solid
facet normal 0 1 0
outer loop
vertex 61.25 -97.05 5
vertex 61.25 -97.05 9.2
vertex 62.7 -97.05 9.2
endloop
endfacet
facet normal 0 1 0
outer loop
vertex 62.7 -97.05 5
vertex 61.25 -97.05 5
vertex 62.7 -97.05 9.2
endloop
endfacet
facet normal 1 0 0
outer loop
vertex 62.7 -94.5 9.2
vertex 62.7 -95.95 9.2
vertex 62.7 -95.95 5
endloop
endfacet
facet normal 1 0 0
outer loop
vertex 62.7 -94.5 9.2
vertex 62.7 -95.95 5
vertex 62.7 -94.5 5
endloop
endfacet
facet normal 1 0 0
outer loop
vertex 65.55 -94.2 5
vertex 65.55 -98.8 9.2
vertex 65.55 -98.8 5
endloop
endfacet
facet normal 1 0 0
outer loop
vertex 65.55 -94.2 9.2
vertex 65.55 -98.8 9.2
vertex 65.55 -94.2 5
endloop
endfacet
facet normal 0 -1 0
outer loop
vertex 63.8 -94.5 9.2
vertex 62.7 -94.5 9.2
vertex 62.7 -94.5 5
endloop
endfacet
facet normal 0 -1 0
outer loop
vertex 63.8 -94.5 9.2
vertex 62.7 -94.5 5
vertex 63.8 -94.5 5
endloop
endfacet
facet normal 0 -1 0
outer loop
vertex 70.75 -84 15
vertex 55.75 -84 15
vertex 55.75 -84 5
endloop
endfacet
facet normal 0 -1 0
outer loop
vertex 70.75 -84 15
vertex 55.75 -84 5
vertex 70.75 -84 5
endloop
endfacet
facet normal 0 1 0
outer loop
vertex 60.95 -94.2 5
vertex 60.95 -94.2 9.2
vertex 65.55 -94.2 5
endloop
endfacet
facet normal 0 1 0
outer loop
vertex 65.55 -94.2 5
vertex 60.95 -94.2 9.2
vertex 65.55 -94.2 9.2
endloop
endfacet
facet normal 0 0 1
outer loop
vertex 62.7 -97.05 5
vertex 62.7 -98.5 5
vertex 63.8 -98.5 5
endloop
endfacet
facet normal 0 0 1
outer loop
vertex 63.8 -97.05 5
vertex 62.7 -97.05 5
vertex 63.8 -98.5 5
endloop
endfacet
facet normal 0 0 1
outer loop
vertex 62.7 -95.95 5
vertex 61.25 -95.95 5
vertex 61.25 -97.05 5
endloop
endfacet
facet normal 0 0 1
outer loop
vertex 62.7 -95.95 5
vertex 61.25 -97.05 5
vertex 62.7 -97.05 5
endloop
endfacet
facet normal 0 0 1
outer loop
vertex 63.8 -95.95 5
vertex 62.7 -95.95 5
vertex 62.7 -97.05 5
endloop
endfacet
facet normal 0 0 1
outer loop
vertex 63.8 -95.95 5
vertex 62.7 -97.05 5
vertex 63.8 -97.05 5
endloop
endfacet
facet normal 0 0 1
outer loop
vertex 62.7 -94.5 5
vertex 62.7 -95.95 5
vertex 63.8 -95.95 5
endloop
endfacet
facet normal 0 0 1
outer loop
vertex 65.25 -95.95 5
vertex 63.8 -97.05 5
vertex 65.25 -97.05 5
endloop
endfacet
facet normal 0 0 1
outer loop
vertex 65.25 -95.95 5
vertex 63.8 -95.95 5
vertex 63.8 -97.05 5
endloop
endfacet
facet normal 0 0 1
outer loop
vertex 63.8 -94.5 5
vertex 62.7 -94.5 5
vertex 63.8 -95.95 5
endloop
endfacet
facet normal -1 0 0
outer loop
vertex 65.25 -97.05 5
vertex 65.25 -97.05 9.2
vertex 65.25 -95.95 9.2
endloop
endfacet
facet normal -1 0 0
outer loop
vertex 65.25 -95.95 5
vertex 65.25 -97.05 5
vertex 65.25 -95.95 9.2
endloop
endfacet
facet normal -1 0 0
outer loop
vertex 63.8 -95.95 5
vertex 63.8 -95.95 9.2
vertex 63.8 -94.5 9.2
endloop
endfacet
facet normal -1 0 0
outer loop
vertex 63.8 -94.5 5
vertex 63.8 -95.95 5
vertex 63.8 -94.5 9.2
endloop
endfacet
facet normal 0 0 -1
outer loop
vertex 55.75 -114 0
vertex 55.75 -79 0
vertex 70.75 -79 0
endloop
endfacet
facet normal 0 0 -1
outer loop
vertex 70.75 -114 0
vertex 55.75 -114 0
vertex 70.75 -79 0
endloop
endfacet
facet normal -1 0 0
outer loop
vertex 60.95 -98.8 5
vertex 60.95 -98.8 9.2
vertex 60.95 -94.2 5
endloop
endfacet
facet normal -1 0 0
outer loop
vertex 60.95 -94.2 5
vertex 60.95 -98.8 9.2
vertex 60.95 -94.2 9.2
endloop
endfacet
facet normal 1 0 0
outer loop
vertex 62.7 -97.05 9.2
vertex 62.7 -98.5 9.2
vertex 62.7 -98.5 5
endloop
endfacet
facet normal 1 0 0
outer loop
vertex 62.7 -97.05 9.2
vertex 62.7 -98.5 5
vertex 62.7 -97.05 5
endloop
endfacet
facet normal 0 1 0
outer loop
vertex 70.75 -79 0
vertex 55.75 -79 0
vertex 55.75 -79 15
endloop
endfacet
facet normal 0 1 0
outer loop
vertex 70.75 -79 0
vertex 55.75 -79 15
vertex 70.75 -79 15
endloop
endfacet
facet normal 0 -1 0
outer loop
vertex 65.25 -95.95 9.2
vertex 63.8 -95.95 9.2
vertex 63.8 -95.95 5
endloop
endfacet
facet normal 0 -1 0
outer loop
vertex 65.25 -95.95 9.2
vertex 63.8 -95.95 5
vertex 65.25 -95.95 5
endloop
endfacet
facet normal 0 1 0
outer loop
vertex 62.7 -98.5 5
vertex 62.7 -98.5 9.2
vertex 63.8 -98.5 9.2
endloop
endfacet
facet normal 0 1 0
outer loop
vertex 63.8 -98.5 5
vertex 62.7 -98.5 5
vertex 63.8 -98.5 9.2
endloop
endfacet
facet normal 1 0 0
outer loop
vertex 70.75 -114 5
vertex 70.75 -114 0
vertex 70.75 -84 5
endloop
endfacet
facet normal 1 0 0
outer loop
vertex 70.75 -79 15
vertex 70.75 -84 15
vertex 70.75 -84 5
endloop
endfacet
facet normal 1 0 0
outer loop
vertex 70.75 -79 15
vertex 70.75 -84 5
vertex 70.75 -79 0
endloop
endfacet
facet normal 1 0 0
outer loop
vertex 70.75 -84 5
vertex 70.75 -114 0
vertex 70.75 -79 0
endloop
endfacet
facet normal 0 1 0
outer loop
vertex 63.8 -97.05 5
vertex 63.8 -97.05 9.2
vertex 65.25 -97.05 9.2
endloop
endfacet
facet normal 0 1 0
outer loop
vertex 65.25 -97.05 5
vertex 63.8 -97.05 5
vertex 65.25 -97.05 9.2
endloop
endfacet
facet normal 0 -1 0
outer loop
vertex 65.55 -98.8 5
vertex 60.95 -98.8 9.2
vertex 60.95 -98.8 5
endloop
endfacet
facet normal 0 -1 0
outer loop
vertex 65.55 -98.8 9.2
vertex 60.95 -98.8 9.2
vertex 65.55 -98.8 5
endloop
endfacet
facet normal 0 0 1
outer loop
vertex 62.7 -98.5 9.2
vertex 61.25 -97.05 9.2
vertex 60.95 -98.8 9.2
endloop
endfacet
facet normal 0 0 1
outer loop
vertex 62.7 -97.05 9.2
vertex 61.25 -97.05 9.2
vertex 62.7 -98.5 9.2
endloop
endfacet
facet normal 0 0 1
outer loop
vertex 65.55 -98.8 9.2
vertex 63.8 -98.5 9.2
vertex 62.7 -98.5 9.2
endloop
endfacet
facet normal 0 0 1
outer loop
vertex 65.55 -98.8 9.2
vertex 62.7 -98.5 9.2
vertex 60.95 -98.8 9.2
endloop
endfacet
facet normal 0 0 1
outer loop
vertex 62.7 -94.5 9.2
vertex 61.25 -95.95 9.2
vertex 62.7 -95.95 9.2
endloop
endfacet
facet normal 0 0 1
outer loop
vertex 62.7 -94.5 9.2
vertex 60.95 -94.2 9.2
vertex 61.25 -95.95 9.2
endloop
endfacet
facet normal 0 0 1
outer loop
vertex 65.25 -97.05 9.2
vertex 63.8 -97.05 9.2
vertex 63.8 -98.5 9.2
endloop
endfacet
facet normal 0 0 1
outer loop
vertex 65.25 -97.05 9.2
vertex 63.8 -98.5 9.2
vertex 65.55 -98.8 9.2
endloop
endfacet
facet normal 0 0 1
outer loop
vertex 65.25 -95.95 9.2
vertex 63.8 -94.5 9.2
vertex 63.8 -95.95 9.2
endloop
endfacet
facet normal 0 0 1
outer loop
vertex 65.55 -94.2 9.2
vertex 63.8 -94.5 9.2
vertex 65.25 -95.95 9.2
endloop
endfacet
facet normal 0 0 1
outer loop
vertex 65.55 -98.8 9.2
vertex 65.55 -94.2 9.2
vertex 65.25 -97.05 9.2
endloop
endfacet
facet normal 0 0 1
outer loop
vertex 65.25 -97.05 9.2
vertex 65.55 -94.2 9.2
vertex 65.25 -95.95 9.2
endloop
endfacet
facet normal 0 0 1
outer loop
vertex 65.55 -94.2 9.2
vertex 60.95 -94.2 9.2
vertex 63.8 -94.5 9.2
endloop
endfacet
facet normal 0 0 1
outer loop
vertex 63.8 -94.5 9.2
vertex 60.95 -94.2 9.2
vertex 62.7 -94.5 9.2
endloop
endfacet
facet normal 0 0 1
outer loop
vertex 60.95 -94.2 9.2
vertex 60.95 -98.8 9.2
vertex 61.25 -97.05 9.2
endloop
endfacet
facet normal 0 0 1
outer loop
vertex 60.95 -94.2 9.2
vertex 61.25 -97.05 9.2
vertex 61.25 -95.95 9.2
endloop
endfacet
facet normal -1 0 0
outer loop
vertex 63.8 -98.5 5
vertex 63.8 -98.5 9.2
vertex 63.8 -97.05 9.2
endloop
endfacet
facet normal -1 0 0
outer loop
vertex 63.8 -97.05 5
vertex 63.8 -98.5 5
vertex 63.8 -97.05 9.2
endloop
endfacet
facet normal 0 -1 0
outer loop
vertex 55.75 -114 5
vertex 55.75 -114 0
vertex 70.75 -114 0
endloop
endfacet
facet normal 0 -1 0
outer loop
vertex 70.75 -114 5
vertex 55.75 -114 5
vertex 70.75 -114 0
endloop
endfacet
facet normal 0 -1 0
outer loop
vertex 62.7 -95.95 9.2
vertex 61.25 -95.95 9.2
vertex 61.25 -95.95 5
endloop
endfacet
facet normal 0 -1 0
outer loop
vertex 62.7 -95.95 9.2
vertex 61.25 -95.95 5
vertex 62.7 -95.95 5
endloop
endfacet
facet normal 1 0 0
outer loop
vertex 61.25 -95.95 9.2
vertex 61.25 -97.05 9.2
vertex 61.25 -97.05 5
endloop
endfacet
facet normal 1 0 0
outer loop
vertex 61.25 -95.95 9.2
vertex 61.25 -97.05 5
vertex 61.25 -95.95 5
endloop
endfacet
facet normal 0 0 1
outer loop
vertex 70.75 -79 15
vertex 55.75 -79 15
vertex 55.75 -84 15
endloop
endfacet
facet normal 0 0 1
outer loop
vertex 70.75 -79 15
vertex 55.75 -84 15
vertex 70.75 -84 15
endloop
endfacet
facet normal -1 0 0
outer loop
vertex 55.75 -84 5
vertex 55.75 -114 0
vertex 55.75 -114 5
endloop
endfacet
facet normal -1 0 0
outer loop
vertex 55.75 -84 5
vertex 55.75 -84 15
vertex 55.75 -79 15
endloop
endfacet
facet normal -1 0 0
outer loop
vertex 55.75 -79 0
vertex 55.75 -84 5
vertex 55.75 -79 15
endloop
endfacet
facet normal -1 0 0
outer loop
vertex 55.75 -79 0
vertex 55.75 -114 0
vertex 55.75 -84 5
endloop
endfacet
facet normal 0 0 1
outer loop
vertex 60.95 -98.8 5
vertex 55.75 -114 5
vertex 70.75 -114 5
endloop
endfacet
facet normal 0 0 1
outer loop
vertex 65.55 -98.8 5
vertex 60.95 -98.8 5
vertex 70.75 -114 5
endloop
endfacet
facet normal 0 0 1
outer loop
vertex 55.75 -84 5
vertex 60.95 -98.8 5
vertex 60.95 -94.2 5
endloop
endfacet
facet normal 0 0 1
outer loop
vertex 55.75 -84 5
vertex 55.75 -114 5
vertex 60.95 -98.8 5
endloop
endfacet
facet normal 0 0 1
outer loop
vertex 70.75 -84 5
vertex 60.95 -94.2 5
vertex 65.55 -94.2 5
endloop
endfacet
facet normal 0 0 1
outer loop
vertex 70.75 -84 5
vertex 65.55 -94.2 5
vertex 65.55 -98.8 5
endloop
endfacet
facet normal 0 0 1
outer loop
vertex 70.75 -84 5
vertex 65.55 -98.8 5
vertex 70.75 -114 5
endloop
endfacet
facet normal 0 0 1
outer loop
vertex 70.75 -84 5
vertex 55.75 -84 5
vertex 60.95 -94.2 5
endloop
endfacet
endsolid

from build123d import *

# Parameters (mm, degrees)
SKETCH_W        = 15
SKETCH_H        = 35
PAD_DEPTH       = 15
SKETCH001_W     = 25
SKETCH001_H     = 36
SKETCH001_W_2   = 4.6
SKETCH001_H_2   = 4.6
SKETCH001_W_3   = 1.1
SKETCH001_H_3   = 4
POCKET_DEPTH    = 10
SKETCH002_W     = 4
SKETCH002_H     = 1.1
POCKET001_DEPTH = 10
SKETCH003_W     = 6
SKETCH003_H     = 6
POCKET002_DEPTH = 5.8


with BuildPart() as part:
    # Sketch → Pad (new body)
    with BuildSketch(Plane.XY):
        with Locations((63.25, -96.5)):
            Rectangle(SKETCH_W, SKETCH_H)
    extrude(amount=PAD_DEPTH)

    # Sketch001 (on DatumPlane) → Pocket (cut)
    with BuildSketch(Plane.XY.offset(15)):
        with Locations((62.5, -102)):
            Rectangle(SKETCH001_W, SKETCH001_H)
        with Locations((63.25, -96.5)):
            Rectangle(SKETCH001_W_2, SKETCH001_H_2, mode=Mode.SUBTRACT)
        with Locations((63.25, -96.5)):
            Rectangle(SKETCH001_W_3, SKETCH001_H_3)
    extrude(amount=-POCKET_DEPTH, mode=Mode.SUBTRACT)

    # Sketch002 (on DatumPlane) → Pocket001 (cut)
    with BuildSketch(Plane.XY.offset(15)):
        with Locations((63.25, -96.5)):
            Rectangle(SKETCH002_W, SKETCH002_H)
    extrude(amount=-POCKET001_DEPTH, mode=Mode.SUBTRACT)

    # Sketch003 (on DatumPlane) → Pocket002 (cut)
    with BuildSketch(Plane.XY.offset(15)):
        with Locations((63, -96)):
            Rectangle(SKETCH003_W, SKETCH003_H)
    extrude(amount=-POCKET002_DEPTH, mode=Mode.SUBTRACT)


solid = part.part
